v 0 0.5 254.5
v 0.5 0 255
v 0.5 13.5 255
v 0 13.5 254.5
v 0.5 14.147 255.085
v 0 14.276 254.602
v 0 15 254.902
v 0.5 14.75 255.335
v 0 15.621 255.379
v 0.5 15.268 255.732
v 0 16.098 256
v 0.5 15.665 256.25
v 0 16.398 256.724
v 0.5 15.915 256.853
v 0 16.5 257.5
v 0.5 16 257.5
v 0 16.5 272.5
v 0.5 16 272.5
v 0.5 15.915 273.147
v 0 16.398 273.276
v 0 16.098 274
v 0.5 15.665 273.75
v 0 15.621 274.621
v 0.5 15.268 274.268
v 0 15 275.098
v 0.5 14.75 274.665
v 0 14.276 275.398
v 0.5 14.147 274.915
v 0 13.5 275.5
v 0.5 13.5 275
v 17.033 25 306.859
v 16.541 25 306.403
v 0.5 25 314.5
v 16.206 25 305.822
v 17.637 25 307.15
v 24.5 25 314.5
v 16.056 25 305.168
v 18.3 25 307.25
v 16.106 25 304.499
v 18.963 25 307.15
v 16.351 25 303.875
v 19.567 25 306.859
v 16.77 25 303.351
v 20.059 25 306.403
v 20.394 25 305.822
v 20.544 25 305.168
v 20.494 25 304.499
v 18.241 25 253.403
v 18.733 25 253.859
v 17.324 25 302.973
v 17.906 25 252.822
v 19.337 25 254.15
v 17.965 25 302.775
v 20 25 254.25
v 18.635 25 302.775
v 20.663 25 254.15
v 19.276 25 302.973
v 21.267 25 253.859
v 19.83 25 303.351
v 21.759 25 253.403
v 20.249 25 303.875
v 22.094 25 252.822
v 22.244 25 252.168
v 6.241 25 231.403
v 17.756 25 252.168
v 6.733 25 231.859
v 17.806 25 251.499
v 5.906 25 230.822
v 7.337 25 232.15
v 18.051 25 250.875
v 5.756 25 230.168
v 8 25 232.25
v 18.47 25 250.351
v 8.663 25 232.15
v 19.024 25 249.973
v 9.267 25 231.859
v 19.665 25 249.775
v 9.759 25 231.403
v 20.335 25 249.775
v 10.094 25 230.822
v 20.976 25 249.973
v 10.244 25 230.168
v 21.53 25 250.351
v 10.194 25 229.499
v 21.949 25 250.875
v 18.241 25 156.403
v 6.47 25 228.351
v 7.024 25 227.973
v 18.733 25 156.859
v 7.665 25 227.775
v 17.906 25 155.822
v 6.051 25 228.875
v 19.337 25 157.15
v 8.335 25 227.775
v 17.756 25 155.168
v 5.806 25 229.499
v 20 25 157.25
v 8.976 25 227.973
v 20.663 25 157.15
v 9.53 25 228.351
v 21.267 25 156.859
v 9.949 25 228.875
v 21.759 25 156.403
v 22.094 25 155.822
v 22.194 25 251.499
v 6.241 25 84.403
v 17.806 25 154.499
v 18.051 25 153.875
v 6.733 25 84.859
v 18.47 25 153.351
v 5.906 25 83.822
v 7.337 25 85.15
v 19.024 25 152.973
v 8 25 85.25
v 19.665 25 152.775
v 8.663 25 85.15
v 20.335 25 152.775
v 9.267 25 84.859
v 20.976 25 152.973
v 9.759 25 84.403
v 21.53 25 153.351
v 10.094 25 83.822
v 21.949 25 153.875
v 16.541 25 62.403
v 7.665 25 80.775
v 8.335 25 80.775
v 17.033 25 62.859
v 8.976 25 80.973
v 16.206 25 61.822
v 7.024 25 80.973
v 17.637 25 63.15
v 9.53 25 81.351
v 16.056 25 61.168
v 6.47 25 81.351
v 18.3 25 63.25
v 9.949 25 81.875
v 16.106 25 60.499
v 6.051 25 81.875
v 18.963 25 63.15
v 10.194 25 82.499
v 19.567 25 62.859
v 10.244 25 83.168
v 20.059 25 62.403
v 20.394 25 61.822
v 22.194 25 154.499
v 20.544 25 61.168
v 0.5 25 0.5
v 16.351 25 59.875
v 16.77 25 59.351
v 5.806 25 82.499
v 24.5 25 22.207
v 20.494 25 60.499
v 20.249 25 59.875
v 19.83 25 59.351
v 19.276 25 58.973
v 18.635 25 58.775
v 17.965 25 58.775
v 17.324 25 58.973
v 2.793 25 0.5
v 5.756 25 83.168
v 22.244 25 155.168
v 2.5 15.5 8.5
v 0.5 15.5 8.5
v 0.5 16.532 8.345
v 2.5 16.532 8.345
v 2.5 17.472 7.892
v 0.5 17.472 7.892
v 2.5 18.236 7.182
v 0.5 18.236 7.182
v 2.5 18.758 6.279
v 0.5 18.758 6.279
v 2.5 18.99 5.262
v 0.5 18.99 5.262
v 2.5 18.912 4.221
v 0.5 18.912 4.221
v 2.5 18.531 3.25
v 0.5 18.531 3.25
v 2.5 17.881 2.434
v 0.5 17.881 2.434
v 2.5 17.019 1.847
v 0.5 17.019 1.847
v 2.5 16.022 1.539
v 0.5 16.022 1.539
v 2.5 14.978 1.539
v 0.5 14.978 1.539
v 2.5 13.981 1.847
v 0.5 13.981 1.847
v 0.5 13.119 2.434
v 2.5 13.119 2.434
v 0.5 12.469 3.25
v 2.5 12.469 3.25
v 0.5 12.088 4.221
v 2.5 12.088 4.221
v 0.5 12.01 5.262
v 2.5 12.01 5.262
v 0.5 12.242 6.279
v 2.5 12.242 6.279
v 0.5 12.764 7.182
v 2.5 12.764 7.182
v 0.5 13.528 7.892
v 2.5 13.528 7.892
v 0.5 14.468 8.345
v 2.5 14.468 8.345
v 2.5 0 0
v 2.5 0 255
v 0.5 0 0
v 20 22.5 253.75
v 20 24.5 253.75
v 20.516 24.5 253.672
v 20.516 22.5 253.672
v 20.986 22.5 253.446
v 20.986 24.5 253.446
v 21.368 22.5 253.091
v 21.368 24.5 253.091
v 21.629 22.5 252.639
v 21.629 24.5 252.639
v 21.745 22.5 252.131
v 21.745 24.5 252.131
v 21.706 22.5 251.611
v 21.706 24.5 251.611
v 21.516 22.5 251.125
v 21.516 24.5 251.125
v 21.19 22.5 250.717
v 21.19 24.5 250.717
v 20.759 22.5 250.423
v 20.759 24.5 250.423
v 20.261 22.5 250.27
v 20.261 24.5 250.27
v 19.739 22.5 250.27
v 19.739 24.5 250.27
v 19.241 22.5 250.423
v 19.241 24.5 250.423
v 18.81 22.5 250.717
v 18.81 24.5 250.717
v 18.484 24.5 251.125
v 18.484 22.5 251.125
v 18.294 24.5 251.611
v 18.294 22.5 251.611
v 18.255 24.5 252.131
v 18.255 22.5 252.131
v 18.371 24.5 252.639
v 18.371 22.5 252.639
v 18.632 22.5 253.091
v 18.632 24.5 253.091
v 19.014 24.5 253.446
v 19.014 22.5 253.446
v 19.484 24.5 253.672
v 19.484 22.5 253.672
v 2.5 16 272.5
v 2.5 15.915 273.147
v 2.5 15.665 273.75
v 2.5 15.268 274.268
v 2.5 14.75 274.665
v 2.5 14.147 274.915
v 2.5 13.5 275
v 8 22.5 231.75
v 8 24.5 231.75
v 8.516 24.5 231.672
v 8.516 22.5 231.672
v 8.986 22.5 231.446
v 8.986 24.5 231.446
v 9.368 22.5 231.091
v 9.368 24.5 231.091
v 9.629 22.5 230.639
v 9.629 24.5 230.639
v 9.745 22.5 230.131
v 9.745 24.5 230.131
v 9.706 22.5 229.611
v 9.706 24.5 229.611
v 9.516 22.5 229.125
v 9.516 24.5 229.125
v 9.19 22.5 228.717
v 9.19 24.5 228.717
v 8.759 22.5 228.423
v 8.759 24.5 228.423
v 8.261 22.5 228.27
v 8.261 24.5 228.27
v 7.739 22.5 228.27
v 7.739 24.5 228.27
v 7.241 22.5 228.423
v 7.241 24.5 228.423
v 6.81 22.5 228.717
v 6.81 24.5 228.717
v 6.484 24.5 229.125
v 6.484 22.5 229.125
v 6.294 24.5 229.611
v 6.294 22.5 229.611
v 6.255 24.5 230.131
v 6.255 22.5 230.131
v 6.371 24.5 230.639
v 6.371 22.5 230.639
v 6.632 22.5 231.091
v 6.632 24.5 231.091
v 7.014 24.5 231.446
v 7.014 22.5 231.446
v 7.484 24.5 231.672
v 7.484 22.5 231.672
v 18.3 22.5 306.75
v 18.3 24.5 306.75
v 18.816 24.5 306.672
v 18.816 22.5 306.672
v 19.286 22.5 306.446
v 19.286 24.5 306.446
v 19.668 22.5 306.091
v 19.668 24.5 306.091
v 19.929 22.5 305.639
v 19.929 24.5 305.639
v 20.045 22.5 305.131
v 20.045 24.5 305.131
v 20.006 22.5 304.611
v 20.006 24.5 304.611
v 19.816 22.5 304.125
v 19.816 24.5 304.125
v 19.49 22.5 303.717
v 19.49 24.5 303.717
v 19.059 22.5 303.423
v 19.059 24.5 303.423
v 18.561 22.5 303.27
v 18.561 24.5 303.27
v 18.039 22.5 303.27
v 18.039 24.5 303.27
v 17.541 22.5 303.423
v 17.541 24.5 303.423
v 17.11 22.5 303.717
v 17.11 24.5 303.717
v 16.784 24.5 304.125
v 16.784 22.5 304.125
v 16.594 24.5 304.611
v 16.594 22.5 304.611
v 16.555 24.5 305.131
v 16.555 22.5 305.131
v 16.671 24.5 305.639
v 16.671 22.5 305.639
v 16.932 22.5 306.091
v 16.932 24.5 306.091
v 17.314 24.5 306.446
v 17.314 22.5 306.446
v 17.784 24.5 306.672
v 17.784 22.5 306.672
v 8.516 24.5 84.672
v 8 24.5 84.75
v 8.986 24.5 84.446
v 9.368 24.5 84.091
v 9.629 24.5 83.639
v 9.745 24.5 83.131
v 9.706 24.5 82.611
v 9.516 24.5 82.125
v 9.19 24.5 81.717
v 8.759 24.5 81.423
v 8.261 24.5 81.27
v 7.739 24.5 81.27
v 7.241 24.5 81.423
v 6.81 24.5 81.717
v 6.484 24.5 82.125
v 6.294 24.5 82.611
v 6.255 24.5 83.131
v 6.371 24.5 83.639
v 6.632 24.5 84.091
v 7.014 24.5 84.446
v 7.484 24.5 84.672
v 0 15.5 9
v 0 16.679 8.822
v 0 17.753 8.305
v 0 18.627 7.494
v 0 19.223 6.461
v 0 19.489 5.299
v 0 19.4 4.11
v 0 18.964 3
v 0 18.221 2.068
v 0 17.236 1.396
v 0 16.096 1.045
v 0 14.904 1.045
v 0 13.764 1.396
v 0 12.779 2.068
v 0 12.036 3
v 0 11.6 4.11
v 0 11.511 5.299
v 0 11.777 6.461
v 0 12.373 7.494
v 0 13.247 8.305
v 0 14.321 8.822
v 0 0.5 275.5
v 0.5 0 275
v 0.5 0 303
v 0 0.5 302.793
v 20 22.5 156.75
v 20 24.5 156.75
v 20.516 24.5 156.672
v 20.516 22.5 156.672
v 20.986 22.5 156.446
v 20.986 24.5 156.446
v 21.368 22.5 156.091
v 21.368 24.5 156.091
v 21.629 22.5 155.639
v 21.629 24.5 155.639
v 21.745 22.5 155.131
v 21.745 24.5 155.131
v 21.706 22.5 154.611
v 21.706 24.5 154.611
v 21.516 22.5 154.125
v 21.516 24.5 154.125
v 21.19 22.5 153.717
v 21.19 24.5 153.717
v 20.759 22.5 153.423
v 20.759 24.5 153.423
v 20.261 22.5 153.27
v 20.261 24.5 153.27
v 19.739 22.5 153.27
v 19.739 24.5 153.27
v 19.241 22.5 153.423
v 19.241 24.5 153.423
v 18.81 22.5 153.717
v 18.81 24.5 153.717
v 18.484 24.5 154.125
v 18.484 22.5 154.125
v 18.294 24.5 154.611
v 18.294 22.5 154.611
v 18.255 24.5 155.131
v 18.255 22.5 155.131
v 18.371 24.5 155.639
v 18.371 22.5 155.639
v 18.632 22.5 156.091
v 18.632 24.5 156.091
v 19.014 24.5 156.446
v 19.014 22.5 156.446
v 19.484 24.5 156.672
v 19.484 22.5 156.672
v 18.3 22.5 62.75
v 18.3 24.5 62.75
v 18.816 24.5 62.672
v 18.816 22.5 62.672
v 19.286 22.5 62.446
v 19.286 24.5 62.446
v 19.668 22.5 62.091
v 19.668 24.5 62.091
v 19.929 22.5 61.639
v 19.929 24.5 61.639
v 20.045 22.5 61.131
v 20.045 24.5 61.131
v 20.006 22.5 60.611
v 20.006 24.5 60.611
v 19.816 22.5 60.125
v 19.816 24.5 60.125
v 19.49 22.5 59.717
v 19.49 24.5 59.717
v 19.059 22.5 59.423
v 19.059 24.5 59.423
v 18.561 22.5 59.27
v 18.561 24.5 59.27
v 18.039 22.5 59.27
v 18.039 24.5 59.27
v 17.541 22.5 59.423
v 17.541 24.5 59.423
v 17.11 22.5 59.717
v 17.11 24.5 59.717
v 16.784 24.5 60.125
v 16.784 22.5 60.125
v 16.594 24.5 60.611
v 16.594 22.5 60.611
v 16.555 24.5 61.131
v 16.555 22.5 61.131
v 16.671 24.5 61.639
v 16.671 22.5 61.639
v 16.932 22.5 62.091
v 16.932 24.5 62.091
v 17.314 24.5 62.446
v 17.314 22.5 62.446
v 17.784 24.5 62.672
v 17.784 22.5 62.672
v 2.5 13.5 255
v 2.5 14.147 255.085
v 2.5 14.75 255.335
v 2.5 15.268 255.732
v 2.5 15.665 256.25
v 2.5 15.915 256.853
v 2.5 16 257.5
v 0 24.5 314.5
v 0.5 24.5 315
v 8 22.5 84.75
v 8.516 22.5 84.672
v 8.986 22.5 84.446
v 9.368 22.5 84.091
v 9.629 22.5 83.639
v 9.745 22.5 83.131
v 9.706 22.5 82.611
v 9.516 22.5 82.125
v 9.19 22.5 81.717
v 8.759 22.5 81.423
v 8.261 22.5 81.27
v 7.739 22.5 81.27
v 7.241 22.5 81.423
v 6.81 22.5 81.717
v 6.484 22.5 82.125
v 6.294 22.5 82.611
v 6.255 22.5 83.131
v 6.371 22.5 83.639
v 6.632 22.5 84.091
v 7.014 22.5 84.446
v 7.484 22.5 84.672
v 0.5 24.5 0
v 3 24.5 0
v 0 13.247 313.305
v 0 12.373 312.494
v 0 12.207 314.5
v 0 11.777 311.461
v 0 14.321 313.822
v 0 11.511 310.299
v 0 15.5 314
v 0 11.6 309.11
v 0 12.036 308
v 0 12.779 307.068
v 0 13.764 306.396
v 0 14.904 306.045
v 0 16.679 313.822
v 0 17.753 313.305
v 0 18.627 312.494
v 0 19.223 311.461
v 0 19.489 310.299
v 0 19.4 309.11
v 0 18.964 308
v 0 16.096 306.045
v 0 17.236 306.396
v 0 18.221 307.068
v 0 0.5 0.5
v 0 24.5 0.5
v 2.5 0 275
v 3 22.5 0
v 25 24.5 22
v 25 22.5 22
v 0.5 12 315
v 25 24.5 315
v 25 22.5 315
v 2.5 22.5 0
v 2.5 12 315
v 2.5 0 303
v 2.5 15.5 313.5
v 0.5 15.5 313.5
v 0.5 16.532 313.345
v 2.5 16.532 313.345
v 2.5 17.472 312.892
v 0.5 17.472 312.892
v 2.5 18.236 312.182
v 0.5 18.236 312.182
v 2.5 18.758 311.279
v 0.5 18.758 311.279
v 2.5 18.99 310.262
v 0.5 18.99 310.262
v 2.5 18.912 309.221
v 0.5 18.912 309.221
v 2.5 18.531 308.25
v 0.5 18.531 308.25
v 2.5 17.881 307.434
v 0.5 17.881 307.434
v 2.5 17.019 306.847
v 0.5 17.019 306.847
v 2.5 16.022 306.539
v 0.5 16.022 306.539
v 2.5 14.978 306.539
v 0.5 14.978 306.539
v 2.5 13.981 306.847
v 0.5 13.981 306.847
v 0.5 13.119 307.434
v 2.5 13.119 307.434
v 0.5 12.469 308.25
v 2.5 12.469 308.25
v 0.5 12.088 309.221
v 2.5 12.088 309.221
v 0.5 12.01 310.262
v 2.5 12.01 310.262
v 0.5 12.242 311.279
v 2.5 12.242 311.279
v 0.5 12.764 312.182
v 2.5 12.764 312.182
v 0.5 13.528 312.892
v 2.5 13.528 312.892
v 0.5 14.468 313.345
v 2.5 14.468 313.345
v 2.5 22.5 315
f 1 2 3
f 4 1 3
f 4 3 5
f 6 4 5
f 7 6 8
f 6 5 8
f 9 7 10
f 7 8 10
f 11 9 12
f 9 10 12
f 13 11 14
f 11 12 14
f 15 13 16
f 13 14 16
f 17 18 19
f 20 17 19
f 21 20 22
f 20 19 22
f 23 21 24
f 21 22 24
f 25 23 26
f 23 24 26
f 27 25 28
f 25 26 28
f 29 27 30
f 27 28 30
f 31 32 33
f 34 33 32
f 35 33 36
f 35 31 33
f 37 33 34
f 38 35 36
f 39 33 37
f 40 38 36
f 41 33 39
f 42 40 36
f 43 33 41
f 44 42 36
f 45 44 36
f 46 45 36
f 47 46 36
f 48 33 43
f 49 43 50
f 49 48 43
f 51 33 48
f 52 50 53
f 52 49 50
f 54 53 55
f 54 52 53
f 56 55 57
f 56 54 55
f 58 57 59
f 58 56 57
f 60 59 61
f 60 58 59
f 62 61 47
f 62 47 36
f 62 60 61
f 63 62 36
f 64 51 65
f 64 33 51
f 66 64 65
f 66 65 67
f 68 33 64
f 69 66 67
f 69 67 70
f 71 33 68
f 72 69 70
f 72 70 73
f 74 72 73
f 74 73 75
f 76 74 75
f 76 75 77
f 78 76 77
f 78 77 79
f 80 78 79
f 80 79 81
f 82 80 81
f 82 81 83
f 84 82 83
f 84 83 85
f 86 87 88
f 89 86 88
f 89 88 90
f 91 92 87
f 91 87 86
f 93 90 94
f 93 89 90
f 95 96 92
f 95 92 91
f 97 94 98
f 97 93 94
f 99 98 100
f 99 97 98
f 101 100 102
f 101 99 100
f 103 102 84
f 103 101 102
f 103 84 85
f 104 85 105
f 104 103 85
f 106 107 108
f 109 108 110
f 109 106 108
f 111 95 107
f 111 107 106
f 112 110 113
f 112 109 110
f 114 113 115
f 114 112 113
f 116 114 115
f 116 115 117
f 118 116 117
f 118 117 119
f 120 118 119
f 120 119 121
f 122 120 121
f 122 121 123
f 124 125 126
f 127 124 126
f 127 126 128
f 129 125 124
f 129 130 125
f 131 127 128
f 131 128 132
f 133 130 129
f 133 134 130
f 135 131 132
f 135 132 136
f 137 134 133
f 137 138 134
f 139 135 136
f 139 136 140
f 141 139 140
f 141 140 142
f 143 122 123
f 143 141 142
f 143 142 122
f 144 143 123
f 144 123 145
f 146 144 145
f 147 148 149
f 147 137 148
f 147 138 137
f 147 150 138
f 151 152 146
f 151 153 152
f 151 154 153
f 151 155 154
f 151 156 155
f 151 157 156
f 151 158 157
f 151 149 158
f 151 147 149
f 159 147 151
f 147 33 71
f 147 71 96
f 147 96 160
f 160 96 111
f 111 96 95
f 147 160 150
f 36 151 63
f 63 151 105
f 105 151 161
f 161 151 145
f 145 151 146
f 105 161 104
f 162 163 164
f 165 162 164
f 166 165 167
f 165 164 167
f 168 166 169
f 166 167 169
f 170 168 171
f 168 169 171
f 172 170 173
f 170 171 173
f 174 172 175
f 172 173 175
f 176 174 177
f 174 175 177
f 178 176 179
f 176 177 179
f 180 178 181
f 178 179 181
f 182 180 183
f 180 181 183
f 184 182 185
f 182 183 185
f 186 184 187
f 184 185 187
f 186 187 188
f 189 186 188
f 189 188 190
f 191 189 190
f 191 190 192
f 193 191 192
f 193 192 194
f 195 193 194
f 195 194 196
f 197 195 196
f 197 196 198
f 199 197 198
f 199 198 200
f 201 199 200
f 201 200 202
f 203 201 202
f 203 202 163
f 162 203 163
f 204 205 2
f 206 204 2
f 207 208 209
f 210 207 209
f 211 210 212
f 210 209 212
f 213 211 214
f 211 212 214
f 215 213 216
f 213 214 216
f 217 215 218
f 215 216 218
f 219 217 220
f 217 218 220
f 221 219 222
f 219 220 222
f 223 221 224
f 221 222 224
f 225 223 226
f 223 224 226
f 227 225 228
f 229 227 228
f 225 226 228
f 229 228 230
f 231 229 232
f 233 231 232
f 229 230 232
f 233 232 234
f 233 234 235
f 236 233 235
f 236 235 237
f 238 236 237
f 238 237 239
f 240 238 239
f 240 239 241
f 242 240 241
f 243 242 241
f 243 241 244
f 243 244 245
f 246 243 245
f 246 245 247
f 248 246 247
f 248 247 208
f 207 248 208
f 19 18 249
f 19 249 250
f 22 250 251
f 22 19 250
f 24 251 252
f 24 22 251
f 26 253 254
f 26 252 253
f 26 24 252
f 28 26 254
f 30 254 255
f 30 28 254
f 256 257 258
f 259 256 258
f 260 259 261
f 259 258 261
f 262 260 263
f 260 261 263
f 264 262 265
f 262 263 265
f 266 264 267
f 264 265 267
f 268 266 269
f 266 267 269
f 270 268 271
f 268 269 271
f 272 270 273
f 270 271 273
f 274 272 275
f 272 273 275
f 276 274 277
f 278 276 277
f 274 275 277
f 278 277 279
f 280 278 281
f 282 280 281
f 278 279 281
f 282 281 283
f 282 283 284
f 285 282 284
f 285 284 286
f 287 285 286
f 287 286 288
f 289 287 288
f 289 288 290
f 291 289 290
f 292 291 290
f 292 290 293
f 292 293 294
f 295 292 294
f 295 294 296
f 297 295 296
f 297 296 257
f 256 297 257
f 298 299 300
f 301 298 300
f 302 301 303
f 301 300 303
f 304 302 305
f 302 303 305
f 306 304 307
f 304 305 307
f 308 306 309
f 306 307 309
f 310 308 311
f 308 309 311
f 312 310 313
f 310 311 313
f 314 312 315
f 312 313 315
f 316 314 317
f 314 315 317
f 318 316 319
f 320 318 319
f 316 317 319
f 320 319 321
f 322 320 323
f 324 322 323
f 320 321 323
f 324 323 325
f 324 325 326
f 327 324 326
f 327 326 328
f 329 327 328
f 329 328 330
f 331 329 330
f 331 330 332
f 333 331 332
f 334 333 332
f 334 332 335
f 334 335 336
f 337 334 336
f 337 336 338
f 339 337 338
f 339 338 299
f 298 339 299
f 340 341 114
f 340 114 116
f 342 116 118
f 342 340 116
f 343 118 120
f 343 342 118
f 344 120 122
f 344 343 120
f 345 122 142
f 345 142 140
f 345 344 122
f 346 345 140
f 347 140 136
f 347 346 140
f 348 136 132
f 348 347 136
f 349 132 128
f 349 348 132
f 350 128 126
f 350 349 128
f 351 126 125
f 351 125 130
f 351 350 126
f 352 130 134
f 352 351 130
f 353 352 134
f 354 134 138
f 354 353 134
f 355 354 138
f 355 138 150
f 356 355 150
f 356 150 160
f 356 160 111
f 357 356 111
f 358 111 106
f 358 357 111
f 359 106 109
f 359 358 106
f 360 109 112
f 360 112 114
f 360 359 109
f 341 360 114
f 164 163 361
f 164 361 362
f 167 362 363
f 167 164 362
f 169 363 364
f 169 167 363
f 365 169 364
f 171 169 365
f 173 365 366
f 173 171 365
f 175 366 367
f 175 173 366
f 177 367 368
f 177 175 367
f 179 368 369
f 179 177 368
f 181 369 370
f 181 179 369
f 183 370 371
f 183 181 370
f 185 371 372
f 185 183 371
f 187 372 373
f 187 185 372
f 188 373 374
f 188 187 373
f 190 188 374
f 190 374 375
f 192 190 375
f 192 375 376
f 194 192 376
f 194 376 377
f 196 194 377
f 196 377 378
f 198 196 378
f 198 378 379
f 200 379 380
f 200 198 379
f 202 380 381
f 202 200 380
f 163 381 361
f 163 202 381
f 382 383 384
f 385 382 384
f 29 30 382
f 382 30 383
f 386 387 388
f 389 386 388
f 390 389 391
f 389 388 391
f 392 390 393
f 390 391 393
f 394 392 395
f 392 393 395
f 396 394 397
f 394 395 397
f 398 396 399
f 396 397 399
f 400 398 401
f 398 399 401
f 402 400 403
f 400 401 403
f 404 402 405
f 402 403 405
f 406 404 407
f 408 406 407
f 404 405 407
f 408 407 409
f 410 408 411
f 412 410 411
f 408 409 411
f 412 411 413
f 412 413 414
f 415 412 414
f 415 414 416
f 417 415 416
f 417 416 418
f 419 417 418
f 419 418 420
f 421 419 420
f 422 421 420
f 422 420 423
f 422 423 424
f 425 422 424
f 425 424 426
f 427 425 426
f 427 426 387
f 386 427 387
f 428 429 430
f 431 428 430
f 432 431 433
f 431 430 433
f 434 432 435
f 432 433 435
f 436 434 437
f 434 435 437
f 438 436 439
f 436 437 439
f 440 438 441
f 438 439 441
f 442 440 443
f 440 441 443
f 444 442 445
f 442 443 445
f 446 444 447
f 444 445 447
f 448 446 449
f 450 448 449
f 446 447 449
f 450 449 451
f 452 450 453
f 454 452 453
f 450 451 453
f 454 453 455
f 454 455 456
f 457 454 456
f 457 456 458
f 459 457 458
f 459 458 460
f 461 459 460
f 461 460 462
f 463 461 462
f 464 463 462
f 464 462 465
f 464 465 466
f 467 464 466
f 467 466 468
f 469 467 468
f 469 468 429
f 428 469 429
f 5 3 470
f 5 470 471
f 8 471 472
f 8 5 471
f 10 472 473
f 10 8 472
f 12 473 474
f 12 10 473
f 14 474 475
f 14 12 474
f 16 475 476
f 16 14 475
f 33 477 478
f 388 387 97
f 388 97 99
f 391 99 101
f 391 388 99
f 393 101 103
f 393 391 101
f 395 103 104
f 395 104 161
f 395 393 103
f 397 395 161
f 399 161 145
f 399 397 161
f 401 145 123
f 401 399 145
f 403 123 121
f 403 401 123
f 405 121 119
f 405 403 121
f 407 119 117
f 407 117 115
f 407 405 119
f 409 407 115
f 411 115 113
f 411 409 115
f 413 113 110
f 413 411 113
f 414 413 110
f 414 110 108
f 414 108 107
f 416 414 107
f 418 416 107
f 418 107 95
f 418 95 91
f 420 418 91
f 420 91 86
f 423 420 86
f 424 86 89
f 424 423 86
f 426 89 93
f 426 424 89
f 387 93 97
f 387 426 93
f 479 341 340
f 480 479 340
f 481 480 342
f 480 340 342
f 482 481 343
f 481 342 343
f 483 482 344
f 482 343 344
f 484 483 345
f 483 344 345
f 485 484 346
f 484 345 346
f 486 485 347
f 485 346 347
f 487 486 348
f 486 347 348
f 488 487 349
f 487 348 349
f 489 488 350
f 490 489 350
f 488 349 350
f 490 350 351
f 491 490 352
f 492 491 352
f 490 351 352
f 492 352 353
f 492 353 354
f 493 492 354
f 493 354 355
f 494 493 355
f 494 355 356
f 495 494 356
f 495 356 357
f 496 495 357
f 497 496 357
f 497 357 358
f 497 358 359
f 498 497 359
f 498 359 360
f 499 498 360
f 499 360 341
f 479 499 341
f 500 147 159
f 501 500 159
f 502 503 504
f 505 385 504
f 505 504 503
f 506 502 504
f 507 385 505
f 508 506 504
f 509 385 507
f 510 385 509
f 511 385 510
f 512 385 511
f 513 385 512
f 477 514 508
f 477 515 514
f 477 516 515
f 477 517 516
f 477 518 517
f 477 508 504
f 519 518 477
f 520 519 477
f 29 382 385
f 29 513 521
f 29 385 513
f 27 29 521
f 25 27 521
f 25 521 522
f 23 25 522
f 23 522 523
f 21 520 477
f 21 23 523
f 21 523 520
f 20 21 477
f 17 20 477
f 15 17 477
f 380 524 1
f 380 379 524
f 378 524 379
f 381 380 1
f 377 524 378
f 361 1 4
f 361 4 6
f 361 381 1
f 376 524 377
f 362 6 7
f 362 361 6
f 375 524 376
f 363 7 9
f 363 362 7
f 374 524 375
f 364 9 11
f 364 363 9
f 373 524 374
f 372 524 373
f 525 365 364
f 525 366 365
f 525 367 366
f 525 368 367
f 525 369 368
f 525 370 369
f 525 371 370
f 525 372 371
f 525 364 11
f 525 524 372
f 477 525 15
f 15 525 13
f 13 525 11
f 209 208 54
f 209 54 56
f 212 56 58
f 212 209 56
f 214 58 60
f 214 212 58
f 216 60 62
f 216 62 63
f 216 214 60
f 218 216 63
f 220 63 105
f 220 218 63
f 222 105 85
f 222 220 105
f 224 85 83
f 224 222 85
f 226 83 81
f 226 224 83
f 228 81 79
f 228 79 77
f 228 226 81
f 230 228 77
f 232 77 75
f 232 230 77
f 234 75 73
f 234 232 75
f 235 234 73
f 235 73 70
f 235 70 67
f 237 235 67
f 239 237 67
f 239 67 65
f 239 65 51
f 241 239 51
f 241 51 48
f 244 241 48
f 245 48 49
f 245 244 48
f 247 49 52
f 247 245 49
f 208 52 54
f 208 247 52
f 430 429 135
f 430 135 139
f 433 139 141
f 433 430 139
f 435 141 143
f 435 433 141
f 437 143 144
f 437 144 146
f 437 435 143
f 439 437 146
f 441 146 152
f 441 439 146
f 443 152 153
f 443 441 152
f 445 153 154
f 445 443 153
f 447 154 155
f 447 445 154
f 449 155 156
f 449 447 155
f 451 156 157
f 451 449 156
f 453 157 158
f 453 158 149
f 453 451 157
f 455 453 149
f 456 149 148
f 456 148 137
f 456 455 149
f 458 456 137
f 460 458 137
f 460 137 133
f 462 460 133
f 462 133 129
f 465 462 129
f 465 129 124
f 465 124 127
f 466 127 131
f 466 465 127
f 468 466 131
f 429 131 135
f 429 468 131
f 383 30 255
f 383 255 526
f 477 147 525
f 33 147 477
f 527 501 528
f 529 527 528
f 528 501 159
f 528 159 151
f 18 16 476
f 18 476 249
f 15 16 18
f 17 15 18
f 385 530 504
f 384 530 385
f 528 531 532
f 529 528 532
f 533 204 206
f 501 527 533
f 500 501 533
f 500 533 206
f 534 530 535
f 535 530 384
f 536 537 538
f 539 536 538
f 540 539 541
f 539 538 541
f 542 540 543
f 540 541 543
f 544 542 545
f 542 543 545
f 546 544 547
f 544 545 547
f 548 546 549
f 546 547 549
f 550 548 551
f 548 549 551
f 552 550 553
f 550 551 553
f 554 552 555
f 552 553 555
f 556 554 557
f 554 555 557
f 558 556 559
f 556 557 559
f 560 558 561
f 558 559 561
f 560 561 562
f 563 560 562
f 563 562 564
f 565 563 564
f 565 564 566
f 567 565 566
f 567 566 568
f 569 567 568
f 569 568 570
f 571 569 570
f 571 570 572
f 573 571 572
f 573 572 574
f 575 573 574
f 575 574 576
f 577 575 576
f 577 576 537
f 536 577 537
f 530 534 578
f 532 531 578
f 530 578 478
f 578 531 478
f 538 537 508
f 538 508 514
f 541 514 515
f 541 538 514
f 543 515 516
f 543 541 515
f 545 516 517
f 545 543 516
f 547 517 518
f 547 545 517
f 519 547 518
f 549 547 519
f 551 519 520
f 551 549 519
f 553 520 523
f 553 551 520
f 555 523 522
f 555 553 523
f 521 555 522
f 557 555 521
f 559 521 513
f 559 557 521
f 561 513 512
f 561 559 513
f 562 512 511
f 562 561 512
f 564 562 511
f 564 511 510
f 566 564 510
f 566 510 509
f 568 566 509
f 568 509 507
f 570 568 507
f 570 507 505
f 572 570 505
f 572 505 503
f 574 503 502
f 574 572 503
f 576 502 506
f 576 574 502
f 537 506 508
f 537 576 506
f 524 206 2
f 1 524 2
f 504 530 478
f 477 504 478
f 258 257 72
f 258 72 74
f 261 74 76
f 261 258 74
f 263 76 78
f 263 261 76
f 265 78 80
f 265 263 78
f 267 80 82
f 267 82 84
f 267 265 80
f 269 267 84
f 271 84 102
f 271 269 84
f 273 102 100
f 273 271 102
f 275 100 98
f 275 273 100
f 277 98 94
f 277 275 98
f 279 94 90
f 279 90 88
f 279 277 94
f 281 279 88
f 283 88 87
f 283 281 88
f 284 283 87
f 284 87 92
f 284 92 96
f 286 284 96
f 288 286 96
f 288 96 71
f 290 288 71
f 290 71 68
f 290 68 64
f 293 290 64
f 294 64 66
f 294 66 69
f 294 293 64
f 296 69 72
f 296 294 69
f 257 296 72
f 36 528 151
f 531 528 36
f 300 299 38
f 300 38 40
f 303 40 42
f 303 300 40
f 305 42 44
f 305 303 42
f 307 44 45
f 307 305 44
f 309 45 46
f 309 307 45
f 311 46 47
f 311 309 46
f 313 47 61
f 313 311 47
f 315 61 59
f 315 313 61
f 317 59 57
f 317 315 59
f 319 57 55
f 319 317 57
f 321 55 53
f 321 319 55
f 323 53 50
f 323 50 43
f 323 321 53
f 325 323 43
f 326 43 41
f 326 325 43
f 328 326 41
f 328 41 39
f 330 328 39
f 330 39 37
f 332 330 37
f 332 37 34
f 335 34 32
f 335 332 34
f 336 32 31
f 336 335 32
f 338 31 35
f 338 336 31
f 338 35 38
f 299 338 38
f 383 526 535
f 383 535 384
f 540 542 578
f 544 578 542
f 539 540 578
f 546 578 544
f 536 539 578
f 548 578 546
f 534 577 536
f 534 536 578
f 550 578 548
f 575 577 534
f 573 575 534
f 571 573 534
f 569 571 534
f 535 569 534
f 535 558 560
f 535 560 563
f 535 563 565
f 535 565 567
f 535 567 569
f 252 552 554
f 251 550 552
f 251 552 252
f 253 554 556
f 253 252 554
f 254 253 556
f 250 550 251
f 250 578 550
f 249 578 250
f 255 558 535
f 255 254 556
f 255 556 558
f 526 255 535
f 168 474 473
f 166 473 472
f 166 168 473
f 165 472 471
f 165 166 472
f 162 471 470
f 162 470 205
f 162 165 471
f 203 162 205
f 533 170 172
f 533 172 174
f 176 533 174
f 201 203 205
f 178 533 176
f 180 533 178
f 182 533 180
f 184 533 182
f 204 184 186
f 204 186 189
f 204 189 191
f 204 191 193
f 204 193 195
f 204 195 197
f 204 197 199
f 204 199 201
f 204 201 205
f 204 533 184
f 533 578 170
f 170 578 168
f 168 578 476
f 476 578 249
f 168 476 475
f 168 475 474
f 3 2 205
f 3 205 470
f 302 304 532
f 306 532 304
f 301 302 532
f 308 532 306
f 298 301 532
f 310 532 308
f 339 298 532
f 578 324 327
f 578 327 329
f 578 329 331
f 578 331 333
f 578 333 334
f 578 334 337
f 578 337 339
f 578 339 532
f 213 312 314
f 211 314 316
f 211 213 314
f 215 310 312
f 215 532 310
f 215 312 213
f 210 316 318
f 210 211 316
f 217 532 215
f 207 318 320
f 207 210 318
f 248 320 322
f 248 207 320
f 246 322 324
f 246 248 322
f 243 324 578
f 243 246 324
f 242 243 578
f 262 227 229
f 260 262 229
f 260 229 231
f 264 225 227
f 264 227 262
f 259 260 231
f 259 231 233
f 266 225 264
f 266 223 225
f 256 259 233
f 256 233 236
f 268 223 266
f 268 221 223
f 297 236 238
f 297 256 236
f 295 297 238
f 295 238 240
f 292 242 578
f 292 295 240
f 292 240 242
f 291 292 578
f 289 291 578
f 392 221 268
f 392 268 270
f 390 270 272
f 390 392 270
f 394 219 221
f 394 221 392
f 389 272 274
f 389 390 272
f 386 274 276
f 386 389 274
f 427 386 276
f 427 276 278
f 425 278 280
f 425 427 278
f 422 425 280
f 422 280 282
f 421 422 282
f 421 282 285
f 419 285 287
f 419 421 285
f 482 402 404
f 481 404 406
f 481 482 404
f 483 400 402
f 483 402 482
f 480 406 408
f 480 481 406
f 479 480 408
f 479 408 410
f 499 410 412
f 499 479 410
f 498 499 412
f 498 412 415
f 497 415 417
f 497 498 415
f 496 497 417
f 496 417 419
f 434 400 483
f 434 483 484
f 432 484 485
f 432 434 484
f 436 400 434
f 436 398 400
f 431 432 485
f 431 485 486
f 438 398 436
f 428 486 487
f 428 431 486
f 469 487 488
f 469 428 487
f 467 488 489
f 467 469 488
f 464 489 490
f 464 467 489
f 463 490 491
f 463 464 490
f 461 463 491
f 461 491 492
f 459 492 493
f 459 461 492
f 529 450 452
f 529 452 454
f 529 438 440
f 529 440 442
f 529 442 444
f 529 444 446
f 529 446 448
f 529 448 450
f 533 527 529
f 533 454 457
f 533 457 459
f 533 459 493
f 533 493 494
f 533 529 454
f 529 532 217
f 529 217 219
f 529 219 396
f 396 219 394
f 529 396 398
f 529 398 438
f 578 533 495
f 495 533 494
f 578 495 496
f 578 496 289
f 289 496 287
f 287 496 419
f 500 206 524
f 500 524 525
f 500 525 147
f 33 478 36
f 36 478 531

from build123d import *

# Parameters (mm, degrees)
BASE_EXTRUSION_DEPTH     = 315
ESQUISSE3_R              = 1.75
ENL_V_MAT_EXTRU_2_DEPTH  = 3
ENL_V_MAT_EXTRU_5_DEPTH  = 3
ENL_V_MAT_EXTRU_6_DEPTH  = 3
ENL_V_MAT_EXTRU_9_DEPTH  = 3
ESQUISSE8_R              = 3.5
ENL_V_MAT_EXTRU_10_DEPTH = 3
CHANFREIN1_SIZE          = 0.5


with BuildPart() as part:
    # Esquisse1 → Base-Extrusion (new body)
    with BuildSketch(Plane.XY):
        Polygon((0, 0), (0, 25), (25, 25), (25, 22.5), (2.5, 22.5), (2.5, 0), align=None)
    extrude(amount=BASE_EXTRUSION_DEPTH)

    # Esquisse3 → Enlèv. mat.-Extru.2 (cut)
    with BuildSketch(Plane(origin=(0, 25, 0), x_dir=(-1, 0, 0), z_dir=(0, 1, 0))):
        with Locations(Location((-18.3, 61, 0), (0, 0, 90))):
            Circle(ESQUISSE3_R)
        with Locations(Location((-8, 83, 0), (0, 0, 90))):
            Circle(ESQUISSE3_R)
        with Locations(Location((-20, 155, 0), (0, 0, 90))):
            Circle(ESQUISSE3_R)
        with Locations(Location((-8, 230, 0), (0, 0, 90))):
            Circle(ESQUISSE3_R)
        with Locations(Location((-20, 252, 0), (0, 0, 90))):
            Circle(ESQUISSE3_R)
        with Locations(Location((-18.3, 305, 0), (0, 0, 90))):
            Circle(ESQUISSE3_R)
    extrude(amount=-ENL_V_MAT_EXTRU_2_DEPTH, mode=Mode.SUBTRACT)

    # Esquisse5 → Enlèv. mat.-Extru.5 (cut)
    with BuildSketch(Plane(origin=(0, 25, 0), x_dir=(-1, 0, 0), z_dir=(0, 1, 0))):
        Polygon((-3, 0), (-25, 22), (-25, 0), align=None)
    extrude(amount=-ENL_V_MAT_EXTRU_5_DEPTH, mode=Mode.SUBTRACT)

    # Esquisse6 → Enlèv. mat.-Extru.6 (cut)
    with BuildSketch(Plane.ZY):
        Polygon((315, 12), (303, 0), (315, 0), align=None)
    extrude(amount=-ENL_V_MAT_EXTRU_6_DEPTH, mode=Mode.SUBTRACT)

    # Esquisse7 → Enlèv. mat.-Extru.9 (cut)
    with BuildSketch(Plane.ZY):
        with BuildLine():
            Line((255, 0), (255, 13.5))
            ThreePointArc((255, 13.5), (255.732233047, 15.267766953), (257.5, 16))
            Line((257.5, 16), (272.5, 16))
            ThreePointArc((272.5, 16), (274.267766953, 15.267766953), (275, 13.5))
            Line((275, 13.5), (275, 0))
            Line((275, 0), (255, 0))
        make_face()
    extrude(amount=-ENL_V_MAT_EXTRU_9_DEPTH, mode=Mode.SUBTRACT)

    # Esquisse8 → Enlèv. mat.-Extru.10 (cut)
    with BuildSketch(Plane.ZY):
        with Locations((310, 15.5)):
            Circle(ESQUISSE8_R)
        with Locations((5, 15.5)):
            Circle(ESQUISSE8_R)
    extrude(amount=-ENL_V_MAT_EXTRU_10_DEPTH, mode=Mode.SUBTRACT)

    # Chanfrein1
    chanfrein1_edges = [part.edges().sort_by_distance(p)[0] for p in [
        (0, 12.5, 0),
        (0, 0, 127.5),
        (0, 25, 157.5),
        (0, 6.75, 255),
        (0, 18.5, 315),
        (0, 15.267766953, 255.732233047),
        (0, 6, 309),
        (0, 16, 265),
        (0, 0, 289),
        (0, 15.267766953, 274.267766953),
        (0, 6.75, 275),
        (0, 15.5, 306.5),
        (0, 15.5, 1.5),
        (1.5, 25, 0),
        (14, 25, 11),
        (25, 25, 168.5),
        (12.5, 25, 315),
        (8, 25, 228.25),
        (18.3, 25, 303.25),
        (20, 25, 250.25),
        (8, 25, 81.25),
        (20, 25, 153.25),
        (18.3, 25, 59.25),
    ]]
    chamfer(chanfrein1_edges, length=CHANFREIN1_SIZE)


solid = part.part
